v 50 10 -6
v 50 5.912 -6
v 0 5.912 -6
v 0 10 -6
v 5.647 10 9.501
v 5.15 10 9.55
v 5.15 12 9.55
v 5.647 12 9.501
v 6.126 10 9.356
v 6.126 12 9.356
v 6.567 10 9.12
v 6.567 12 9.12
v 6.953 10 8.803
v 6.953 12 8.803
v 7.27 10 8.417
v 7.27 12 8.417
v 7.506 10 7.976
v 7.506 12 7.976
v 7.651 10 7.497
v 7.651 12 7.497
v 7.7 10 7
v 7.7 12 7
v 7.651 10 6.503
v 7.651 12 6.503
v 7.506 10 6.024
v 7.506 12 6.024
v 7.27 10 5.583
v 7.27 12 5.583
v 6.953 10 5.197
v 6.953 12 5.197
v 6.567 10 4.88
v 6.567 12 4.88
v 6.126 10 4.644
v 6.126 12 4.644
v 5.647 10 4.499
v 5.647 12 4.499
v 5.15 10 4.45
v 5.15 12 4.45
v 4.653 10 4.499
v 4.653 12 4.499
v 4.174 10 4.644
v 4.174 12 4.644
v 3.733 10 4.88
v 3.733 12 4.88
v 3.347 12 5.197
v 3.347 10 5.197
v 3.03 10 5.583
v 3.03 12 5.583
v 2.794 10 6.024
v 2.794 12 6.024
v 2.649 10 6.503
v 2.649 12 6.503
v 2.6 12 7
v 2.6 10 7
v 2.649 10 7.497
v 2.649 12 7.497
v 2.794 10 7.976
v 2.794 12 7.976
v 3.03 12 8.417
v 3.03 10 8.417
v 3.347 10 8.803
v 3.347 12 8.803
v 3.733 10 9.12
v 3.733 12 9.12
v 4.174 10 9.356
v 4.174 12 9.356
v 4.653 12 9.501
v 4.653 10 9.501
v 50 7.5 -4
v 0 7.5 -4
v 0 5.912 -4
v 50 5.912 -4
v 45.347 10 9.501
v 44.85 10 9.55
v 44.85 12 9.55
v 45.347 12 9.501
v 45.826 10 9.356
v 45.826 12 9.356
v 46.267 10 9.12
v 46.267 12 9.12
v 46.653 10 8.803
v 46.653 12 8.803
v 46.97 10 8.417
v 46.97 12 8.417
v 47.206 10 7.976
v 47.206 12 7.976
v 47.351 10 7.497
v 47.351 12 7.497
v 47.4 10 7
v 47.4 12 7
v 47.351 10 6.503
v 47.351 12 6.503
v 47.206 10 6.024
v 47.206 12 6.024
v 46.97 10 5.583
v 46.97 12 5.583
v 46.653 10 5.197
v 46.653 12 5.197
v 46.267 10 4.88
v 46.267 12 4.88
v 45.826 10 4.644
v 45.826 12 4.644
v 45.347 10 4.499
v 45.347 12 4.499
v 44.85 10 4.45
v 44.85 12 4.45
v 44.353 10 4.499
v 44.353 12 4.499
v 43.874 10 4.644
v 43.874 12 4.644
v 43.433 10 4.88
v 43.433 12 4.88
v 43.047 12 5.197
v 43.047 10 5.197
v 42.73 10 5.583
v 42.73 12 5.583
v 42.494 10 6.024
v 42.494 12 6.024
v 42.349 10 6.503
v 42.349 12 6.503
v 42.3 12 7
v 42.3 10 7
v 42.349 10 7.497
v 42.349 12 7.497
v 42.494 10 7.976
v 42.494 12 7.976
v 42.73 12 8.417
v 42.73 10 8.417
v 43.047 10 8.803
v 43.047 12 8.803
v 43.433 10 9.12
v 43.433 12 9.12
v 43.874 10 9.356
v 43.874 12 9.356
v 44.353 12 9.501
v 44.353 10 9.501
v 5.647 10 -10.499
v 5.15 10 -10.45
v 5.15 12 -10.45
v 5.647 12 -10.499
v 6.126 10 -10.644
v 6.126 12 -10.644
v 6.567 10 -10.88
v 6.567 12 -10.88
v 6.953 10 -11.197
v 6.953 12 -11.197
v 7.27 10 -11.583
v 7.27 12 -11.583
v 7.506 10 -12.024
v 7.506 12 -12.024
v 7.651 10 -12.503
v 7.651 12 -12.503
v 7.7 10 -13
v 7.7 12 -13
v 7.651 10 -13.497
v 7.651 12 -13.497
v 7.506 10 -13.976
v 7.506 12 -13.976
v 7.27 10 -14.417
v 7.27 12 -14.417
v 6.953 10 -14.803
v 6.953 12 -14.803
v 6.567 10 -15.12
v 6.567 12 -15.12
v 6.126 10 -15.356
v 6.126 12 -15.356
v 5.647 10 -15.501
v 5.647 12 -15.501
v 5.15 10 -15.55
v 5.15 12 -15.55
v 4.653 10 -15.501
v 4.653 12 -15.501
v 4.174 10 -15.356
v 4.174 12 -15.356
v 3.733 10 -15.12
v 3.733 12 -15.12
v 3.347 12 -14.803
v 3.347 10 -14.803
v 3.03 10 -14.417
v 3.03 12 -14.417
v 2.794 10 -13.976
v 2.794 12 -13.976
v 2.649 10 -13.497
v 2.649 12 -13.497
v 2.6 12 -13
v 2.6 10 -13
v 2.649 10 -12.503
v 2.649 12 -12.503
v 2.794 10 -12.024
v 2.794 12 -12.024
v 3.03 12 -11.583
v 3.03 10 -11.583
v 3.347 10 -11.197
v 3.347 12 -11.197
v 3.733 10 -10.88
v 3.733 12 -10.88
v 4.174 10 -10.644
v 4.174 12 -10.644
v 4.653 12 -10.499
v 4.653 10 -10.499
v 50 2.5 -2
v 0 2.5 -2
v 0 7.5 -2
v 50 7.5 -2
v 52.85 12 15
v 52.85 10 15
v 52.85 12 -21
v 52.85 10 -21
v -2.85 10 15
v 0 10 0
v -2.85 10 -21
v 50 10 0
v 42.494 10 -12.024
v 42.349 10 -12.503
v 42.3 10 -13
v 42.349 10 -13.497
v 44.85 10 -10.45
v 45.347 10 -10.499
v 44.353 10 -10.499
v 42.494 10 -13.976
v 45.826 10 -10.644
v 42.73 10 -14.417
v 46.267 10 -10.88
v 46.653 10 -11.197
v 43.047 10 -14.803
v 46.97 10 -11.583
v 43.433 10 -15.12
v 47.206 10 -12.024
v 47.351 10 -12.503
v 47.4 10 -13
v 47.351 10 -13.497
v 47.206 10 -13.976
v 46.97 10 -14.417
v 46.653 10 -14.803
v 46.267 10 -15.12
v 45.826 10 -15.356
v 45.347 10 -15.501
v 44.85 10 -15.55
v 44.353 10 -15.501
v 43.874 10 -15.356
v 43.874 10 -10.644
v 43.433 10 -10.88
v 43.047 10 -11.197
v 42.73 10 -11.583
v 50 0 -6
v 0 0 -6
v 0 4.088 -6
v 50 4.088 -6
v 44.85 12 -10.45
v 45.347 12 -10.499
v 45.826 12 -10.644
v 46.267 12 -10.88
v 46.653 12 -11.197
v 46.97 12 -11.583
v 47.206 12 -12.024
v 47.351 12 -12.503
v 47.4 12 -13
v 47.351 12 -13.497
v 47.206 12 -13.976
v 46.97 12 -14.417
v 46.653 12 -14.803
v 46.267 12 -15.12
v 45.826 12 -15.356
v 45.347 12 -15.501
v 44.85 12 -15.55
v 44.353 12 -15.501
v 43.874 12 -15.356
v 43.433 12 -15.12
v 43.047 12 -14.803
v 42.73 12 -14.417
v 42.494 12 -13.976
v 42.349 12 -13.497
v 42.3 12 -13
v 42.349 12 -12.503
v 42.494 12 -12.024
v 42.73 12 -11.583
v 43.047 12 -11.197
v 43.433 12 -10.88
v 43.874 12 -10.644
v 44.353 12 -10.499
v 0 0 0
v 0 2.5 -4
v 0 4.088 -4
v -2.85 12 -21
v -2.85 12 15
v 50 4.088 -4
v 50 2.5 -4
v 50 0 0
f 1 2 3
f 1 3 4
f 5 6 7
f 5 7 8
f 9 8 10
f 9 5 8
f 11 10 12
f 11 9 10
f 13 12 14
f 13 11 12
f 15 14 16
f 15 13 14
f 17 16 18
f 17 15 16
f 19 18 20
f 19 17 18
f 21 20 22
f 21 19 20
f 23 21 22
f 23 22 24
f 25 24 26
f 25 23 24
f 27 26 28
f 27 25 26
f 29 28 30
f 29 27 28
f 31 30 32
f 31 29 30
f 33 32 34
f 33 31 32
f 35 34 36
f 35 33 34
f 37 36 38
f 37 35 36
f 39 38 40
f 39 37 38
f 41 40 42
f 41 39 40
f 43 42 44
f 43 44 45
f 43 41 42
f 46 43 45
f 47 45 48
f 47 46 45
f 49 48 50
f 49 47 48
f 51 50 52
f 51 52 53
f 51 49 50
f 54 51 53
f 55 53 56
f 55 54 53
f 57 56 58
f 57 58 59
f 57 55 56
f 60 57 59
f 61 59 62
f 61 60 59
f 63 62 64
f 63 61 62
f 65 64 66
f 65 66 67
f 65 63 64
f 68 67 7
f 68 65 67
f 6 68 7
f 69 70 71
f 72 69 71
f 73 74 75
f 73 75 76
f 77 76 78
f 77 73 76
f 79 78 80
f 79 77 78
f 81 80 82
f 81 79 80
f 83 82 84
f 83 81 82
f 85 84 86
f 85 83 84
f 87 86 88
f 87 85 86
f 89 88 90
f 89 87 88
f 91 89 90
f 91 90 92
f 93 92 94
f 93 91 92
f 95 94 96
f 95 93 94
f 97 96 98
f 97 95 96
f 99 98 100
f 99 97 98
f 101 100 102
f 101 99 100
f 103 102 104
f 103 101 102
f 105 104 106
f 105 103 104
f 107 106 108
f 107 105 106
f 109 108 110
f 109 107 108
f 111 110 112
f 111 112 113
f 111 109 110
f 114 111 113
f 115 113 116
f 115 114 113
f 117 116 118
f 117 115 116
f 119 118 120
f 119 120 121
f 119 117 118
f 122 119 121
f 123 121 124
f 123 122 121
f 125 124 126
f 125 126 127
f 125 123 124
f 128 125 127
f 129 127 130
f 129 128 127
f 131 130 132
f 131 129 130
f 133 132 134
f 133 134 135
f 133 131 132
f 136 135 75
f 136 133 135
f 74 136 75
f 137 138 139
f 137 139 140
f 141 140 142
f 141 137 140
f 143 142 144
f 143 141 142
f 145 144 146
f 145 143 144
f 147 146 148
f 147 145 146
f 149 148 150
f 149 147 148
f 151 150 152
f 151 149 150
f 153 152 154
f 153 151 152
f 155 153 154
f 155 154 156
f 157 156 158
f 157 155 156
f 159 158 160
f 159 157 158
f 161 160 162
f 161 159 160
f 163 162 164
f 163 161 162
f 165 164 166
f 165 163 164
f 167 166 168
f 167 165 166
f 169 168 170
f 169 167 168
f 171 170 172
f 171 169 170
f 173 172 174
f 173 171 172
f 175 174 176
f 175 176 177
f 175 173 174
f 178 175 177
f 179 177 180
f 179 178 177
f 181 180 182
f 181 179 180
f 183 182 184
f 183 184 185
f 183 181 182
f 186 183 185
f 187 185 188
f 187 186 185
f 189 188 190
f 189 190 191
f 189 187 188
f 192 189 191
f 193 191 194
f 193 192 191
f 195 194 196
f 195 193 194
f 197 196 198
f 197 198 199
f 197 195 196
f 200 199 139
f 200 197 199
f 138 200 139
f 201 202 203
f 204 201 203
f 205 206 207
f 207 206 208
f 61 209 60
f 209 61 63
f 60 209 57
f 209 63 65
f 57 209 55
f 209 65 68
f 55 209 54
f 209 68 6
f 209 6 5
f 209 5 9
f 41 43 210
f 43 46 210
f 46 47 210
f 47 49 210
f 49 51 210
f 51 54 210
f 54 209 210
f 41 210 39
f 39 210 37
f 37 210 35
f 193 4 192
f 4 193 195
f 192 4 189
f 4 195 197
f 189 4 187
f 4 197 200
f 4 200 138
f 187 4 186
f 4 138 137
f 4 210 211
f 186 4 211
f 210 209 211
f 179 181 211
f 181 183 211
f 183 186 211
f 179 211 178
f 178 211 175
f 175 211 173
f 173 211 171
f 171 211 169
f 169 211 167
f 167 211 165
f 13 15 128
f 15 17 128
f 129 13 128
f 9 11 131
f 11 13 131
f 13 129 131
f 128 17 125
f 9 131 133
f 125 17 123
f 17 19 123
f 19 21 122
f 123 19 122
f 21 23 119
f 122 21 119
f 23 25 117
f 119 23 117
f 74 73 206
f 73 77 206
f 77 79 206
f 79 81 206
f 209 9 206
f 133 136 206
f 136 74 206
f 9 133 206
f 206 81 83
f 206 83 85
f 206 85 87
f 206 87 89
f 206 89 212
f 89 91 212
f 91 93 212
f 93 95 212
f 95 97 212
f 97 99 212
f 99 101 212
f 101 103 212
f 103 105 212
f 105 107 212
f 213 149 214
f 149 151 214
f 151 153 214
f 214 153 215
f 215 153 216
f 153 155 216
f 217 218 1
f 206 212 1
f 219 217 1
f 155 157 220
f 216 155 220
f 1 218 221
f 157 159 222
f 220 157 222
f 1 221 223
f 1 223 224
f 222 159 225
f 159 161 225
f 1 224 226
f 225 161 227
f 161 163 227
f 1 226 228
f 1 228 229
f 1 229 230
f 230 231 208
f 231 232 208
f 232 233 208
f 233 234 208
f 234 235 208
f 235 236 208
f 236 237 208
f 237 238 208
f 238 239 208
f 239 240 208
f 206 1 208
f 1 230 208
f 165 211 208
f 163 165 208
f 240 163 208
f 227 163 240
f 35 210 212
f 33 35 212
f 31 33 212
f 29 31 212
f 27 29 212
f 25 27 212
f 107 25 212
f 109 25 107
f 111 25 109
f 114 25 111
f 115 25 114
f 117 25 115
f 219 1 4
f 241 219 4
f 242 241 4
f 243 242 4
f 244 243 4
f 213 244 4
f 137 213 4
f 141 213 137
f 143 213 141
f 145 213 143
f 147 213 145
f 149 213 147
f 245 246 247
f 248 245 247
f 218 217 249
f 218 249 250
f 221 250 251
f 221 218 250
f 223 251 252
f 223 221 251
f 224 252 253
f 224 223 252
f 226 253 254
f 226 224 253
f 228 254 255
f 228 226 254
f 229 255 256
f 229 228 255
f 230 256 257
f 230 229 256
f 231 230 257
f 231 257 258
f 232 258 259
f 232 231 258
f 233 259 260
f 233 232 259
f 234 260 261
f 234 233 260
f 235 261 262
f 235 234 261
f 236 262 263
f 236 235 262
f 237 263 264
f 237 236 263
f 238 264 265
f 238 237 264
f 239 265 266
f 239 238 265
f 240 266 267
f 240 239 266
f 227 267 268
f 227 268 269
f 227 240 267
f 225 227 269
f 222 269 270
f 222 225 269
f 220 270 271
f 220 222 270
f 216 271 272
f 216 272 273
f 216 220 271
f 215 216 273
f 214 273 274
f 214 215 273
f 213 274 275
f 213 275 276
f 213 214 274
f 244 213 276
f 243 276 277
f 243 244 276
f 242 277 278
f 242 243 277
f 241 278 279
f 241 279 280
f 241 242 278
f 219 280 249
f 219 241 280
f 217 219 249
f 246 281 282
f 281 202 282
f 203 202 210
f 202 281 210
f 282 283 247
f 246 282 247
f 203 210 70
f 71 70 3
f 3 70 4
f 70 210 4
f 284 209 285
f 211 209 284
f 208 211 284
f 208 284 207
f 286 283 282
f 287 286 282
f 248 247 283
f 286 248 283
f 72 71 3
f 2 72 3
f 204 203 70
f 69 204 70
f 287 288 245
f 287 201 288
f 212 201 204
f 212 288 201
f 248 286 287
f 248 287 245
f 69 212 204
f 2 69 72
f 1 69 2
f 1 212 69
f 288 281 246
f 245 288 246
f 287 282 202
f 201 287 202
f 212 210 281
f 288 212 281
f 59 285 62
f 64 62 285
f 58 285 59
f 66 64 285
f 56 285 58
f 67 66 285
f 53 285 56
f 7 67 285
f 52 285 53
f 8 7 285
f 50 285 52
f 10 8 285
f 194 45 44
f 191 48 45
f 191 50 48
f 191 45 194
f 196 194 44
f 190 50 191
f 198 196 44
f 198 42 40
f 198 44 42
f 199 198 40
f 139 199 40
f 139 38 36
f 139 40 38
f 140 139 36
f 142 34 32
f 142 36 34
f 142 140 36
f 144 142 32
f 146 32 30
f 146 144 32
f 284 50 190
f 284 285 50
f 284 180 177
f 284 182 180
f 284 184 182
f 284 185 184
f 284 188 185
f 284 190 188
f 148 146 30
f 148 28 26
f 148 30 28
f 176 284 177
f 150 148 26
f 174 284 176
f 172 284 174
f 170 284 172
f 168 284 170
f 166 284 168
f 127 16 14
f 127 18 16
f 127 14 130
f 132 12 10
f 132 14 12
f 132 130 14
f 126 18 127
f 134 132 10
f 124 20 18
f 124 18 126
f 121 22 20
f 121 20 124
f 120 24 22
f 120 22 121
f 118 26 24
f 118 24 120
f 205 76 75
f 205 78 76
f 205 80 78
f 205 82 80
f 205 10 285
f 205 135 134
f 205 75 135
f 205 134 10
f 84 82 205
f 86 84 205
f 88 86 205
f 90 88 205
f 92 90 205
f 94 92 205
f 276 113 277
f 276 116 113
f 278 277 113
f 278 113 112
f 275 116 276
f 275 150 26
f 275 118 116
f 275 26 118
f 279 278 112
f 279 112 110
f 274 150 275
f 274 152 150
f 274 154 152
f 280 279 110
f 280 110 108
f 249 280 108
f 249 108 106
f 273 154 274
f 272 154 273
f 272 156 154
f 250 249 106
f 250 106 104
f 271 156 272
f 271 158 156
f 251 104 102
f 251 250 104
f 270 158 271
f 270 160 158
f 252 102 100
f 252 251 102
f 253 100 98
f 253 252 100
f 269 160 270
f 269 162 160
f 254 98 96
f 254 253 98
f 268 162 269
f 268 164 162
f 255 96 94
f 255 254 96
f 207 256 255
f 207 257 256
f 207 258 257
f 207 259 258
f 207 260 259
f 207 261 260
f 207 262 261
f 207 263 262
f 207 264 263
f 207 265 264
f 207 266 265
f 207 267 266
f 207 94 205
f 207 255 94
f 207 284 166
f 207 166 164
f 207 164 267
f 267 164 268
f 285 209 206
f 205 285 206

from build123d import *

# Parameters (mm, degrees)
BOSS_EXTRUDE1_DEPTH = 50
SKETCH2_W           = 55.7
SKETCH2_H           = 36
SKETCH2_R           = 2.55
BOSS_EXTRUDE2_DEPTH = 2


with BuildPart() as part:
    # Sketch1 → Boss-Extrude1 (new body)
    with BuildSketch(Plane(origin=(0, 0, 0), x_dir=(0, 0, -1), z_dir=(1, 0, 0))):
        Polygon((0, 10), (0, 0), (6, 0), (6, 4.0875), (4, 4.0875), (4, 2.5), (2, 2.5), (2, 7.5), (4, 7.5), (4, 5.9125), (6, 5.9125), (6, 10), align=None)
    extrude(amount=BOSS_EXTRUDE1_DEPTH)

    # Sketch2 → Boss-Extrude2 (add)
    with BuildSketch(Plane(origin=(0, 10, 0), x_dir=(1, 0, 0), z_dir=(0, 1, 0))):
        with Locations((25, 3)):
            Rectangle(SKETCH2_W, SKETCH2_H)
        with Locations(Location((5.15, 13, 0), (0, 0, 270))):
            Circle(SKETCH2_R, mode=Mode.SUBTRACT)
        with Locations(Location((44.85, 13, 0), (0, 0, 270))):
            Circle(SKETCH2_R, mode=Mode.SUBTRACT)
        with Locations(Location((44.85, -7, 0), (0, 0, 270))):
            Circle(SKETCH2_R, mode=Mode.SUBTRACT)
        with Locations(Location((5.15, -7, 0), (0, 0, 270))):
            Circle(SKETCH2_R, mode=Mode.SUBTRACT)
    extrude(amount=BOSS_EXTRUDE2_DEPTH)


solid = part.part
